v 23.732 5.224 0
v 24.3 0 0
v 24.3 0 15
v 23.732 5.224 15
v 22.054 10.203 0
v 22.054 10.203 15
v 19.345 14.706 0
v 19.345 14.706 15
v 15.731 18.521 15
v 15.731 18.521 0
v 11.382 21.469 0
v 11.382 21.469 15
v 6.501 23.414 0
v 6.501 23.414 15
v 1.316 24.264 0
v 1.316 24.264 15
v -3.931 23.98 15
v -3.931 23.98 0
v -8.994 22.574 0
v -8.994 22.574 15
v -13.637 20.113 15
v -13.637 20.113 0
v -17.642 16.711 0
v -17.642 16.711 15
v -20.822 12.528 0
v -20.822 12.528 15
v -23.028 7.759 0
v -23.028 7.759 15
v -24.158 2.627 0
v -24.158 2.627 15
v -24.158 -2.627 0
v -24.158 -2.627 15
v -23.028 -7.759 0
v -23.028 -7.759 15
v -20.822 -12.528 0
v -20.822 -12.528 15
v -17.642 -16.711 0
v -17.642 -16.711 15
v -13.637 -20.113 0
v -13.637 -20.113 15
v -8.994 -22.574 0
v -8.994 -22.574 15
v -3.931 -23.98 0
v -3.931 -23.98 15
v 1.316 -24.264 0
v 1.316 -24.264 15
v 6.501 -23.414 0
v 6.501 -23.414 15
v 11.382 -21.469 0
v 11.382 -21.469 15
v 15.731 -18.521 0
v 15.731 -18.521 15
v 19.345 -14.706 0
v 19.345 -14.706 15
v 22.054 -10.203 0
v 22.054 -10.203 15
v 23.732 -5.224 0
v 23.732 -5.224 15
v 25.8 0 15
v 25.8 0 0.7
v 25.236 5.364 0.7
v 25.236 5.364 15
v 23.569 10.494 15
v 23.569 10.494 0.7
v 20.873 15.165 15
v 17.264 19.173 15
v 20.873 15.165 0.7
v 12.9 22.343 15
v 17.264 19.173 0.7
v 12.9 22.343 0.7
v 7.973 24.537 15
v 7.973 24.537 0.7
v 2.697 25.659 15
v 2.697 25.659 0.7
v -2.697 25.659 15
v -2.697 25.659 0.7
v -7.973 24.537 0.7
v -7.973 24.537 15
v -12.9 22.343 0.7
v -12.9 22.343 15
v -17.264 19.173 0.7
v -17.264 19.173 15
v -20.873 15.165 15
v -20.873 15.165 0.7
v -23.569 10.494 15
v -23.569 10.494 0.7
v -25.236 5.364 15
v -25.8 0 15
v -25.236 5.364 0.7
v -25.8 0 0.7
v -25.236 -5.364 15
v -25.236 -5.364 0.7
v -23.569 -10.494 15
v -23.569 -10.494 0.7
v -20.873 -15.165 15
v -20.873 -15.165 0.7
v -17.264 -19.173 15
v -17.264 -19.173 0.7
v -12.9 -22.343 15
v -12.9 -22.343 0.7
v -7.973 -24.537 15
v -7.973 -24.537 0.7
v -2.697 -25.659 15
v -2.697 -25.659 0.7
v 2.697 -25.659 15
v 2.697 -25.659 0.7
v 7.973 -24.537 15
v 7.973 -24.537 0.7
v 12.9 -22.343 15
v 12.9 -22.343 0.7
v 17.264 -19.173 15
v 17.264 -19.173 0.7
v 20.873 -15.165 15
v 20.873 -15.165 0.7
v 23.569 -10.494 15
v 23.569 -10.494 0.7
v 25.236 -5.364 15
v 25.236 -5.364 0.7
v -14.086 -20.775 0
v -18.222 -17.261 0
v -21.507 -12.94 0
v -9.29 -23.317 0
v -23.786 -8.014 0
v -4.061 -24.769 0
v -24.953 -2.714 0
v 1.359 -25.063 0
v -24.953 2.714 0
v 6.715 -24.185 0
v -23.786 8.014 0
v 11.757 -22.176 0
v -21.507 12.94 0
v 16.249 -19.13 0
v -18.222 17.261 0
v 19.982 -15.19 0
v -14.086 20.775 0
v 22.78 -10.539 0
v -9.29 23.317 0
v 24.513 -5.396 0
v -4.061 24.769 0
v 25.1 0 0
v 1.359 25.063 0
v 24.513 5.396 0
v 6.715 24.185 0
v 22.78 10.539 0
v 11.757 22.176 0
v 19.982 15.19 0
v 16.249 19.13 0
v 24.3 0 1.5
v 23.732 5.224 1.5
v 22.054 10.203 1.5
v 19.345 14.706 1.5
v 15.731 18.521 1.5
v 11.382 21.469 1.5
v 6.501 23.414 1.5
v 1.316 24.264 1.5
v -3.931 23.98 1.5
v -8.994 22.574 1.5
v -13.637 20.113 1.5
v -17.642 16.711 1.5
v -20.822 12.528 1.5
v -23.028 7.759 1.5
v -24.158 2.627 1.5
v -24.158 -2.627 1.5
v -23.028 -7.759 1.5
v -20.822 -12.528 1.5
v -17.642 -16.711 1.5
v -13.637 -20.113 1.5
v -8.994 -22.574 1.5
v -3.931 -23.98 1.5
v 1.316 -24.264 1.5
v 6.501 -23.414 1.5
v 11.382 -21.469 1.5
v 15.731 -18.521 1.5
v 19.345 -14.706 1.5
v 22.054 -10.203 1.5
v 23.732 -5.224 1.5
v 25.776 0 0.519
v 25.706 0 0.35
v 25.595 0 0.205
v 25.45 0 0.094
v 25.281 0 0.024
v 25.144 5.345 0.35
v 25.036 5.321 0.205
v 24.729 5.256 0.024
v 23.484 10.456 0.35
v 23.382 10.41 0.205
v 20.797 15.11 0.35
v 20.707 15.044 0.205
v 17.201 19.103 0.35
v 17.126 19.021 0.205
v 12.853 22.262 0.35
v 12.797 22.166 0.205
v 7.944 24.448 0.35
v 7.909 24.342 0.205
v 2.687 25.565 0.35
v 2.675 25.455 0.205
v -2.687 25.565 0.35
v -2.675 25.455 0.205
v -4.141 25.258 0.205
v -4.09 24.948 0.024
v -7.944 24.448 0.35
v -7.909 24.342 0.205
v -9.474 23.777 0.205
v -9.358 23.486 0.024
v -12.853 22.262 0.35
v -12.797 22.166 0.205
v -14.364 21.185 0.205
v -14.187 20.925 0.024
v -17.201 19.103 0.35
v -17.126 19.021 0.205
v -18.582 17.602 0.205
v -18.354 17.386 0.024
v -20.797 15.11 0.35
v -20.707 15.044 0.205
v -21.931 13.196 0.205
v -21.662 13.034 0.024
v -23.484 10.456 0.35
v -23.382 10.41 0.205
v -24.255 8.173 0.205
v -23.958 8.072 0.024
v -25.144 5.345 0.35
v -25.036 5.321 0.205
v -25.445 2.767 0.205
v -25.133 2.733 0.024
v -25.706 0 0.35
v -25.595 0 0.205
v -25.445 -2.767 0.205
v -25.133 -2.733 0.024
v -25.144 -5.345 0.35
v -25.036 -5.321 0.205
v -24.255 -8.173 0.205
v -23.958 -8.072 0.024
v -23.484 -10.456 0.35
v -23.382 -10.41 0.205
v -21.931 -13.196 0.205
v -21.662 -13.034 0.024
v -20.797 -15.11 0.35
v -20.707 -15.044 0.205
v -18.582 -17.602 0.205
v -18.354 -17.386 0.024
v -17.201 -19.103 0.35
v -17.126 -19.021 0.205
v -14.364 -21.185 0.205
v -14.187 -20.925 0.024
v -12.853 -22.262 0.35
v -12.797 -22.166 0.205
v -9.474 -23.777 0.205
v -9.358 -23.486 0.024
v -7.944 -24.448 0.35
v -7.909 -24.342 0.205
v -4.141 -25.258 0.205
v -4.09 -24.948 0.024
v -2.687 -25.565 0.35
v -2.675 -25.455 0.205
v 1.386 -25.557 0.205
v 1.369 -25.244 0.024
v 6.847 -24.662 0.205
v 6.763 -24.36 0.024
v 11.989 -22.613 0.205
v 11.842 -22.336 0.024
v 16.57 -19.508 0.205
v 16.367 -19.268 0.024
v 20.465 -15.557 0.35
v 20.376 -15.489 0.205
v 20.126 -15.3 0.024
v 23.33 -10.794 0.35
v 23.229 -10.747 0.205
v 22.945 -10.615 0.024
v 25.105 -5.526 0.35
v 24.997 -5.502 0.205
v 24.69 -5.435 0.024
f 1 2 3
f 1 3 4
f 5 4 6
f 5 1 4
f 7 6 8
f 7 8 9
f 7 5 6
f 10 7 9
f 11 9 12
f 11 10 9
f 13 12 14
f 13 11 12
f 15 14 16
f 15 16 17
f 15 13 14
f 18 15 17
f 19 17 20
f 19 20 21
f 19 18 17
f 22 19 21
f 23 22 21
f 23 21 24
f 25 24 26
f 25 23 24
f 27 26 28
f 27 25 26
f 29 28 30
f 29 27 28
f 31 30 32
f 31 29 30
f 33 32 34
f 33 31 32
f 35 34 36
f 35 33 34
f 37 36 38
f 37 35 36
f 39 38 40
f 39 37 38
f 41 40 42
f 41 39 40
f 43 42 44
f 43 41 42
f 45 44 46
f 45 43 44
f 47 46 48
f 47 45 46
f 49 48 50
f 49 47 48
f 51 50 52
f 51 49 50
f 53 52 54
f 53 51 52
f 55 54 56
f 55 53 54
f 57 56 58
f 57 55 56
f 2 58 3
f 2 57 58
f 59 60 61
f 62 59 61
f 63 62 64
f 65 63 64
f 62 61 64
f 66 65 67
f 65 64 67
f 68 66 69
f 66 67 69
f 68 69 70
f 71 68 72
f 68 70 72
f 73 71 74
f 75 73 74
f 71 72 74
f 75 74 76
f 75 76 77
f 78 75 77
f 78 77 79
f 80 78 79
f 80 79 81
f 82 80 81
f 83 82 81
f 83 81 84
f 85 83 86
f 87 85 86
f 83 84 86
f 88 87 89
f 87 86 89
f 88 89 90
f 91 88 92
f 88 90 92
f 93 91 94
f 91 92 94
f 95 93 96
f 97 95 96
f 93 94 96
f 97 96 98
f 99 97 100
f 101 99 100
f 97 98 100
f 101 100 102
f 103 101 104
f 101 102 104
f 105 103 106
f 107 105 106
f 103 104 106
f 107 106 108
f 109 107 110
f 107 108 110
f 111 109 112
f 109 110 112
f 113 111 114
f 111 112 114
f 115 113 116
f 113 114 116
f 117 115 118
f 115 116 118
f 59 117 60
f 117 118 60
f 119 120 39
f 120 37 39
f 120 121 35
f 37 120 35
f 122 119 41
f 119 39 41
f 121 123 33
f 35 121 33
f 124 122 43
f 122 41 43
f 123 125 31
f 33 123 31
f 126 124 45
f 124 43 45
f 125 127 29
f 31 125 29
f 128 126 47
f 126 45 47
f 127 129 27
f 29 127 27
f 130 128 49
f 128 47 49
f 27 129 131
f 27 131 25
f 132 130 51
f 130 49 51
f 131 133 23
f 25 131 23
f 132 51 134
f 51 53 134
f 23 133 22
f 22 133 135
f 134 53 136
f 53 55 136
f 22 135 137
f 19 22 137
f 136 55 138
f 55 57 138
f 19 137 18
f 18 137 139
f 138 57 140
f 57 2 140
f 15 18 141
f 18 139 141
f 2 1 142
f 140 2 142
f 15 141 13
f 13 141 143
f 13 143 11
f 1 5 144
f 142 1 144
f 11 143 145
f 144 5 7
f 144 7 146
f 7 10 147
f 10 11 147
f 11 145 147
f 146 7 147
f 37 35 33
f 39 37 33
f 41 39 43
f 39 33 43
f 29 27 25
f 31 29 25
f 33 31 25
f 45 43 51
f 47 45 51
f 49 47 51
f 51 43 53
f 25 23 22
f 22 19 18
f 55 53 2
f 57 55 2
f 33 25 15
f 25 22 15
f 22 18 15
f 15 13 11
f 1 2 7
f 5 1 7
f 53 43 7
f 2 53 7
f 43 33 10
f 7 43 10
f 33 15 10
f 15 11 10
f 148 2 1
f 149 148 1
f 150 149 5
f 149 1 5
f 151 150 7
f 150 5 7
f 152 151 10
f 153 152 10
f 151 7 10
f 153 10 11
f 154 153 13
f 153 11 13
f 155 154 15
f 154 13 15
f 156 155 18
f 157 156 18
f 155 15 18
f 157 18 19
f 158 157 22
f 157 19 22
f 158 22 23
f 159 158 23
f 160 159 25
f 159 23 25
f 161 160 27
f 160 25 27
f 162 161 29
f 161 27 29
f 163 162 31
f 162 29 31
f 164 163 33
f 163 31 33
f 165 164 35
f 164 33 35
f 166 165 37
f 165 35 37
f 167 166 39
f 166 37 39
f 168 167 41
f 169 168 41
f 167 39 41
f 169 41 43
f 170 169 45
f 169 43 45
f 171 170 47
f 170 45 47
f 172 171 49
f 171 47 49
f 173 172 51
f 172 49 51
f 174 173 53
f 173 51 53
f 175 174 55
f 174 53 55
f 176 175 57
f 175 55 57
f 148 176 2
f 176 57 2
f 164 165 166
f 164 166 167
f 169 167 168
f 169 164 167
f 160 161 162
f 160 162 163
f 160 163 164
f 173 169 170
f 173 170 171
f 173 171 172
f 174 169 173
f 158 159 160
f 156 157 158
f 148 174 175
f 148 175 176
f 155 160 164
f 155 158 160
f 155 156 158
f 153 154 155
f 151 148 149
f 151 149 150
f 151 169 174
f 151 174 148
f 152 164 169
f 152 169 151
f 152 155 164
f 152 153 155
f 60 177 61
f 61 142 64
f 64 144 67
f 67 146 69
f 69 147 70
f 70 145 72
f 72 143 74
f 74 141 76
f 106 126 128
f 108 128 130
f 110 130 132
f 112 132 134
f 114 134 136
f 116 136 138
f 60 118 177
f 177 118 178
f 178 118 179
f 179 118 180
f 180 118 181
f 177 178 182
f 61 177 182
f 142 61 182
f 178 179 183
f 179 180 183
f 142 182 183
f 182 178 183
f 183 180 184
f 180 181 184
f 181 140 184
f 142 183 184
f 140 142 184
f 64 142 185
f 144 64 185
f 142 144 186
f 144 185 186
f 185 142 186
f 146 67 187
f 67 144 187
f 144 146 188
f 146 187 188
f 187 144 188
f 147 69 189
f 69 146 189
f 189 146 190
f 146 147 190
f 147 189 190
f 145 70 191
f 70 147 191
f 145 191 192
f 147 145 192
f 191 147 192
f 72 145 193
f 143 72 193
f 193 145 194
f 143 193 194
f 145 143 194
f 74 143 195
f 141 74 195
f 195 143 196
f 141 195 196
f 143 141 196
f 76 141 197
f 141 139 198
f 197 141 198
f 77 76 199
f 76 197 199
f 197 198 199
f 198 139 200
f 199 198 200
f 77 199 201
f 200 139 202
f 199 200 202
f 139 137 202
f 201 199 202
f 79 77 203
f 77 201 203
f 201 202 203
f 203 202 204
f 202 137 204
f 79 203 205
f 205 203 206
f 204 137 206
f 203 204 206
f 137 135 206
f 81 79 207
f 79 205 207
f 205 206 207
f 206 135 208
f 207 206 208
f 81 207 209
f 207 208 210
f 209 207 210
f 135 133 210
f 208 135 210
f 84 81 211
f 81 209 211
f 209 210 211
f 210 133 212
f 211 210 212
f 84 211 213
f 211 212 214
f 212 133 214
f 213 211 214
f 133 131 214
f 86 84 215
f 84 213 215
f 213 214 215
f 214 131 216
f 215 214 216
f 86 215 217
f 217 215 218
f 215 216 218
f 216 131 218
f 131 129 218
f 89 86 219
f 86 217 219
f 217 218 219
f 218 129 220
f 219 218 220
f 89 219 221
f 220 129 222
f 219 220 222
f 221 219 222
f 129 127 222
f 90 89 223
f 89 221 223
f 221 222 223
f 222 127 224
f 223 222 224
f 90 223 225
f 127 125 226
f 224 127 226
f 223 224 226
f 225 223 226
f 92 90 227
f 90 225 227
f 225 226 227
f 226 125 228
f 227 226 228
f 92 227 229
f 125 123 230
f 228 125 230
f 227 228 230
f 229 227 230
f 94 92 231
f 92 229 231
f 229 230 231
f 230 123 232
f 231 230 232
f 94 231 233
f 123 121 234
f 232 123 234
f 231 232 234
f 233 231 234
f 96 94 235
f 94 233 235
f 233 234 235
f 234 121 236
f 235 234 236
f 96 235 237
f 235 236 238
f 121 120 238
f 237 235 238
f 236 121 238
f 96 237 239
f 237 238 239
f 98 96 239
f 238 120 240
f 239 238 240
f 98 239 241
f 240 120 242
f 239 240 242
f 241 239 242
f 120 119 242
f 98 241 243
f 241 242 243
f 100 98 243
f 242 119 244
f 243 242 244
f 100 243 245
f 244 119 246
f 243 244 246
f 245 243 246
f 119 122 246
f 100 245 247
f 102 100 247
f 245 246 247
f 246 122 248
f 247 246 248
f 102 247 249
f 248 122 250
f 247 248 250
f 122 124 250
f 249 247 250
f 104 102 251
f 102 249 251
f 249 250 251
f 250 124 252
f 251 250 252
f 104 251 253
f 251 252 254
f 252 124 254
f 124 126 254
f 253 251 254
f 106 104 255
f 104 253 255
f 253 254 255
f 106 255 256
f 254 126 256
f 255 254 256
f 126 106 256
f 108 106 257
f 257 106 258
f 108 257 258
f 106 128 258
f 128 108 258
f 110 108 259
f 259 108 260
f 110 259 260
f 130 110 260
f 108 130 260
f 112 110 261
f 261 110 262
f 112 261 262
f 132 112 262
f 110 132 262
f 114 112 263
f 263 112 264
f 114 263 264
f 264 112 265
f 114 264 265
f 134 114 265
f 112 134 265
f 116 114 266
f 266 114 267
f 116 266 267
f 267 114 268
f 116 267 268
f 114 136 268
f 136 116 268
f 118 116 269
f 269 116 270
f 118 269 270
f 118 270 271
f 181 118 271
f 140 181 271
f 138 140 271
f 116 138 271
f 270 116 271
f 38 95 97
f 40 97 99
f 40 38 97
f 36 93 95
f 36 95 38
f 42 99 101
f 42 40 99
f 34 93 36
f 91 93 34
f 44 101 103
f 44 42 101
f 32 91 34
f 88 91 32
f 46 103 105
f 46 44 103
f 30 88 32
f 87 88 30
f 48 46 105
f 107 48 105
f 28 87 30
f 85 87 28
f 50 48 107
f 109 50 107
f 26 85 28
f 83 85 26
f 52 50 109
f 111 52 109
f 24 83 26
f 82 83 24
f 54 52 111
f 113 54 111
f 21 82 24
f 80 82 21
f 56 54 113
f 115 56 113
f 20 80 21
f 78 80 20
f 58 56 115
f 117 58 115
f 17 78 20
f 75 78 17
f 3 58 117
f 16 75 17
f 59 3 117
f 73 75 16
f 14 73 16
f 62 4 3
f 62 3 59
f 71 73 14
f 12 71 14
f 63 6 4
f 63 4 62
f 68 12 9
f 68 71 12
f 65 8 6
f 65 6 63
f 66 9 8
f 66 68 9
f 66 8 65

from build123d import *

# Parameters (mm, degrees)
F0_R     = 24.3
F1_DEPTH = 1.5
F0_R_2   = 25.8
F2_DEPTH = 15
F3_R     = 0.7


with BuildPart() as f1:
    # F0 (on Top) → F1 (new body)
    with BuildSketch(Plane.XY):
        Circle(F0_R)
    extrude(amount=F1_DEPTH)


with BuildPart() as f2:
    # F0 (on Top) → F2 (new body)
    with BuildSketch(Plane.XY):
        Circle(F0_R_2)
        Circle(F0_R, mode=Mode.SUBTRACT)
    extrude(amount=F2_DEPTH)

    # F3
    f3_edges = [f2.edges().sort_by_distance(p)[0] for p in [
        (-25.8, 0, 0),
    ]]
    fillet(f3_edges, radius=F3_R)


solid = Compound([f1.part, f2.part])
